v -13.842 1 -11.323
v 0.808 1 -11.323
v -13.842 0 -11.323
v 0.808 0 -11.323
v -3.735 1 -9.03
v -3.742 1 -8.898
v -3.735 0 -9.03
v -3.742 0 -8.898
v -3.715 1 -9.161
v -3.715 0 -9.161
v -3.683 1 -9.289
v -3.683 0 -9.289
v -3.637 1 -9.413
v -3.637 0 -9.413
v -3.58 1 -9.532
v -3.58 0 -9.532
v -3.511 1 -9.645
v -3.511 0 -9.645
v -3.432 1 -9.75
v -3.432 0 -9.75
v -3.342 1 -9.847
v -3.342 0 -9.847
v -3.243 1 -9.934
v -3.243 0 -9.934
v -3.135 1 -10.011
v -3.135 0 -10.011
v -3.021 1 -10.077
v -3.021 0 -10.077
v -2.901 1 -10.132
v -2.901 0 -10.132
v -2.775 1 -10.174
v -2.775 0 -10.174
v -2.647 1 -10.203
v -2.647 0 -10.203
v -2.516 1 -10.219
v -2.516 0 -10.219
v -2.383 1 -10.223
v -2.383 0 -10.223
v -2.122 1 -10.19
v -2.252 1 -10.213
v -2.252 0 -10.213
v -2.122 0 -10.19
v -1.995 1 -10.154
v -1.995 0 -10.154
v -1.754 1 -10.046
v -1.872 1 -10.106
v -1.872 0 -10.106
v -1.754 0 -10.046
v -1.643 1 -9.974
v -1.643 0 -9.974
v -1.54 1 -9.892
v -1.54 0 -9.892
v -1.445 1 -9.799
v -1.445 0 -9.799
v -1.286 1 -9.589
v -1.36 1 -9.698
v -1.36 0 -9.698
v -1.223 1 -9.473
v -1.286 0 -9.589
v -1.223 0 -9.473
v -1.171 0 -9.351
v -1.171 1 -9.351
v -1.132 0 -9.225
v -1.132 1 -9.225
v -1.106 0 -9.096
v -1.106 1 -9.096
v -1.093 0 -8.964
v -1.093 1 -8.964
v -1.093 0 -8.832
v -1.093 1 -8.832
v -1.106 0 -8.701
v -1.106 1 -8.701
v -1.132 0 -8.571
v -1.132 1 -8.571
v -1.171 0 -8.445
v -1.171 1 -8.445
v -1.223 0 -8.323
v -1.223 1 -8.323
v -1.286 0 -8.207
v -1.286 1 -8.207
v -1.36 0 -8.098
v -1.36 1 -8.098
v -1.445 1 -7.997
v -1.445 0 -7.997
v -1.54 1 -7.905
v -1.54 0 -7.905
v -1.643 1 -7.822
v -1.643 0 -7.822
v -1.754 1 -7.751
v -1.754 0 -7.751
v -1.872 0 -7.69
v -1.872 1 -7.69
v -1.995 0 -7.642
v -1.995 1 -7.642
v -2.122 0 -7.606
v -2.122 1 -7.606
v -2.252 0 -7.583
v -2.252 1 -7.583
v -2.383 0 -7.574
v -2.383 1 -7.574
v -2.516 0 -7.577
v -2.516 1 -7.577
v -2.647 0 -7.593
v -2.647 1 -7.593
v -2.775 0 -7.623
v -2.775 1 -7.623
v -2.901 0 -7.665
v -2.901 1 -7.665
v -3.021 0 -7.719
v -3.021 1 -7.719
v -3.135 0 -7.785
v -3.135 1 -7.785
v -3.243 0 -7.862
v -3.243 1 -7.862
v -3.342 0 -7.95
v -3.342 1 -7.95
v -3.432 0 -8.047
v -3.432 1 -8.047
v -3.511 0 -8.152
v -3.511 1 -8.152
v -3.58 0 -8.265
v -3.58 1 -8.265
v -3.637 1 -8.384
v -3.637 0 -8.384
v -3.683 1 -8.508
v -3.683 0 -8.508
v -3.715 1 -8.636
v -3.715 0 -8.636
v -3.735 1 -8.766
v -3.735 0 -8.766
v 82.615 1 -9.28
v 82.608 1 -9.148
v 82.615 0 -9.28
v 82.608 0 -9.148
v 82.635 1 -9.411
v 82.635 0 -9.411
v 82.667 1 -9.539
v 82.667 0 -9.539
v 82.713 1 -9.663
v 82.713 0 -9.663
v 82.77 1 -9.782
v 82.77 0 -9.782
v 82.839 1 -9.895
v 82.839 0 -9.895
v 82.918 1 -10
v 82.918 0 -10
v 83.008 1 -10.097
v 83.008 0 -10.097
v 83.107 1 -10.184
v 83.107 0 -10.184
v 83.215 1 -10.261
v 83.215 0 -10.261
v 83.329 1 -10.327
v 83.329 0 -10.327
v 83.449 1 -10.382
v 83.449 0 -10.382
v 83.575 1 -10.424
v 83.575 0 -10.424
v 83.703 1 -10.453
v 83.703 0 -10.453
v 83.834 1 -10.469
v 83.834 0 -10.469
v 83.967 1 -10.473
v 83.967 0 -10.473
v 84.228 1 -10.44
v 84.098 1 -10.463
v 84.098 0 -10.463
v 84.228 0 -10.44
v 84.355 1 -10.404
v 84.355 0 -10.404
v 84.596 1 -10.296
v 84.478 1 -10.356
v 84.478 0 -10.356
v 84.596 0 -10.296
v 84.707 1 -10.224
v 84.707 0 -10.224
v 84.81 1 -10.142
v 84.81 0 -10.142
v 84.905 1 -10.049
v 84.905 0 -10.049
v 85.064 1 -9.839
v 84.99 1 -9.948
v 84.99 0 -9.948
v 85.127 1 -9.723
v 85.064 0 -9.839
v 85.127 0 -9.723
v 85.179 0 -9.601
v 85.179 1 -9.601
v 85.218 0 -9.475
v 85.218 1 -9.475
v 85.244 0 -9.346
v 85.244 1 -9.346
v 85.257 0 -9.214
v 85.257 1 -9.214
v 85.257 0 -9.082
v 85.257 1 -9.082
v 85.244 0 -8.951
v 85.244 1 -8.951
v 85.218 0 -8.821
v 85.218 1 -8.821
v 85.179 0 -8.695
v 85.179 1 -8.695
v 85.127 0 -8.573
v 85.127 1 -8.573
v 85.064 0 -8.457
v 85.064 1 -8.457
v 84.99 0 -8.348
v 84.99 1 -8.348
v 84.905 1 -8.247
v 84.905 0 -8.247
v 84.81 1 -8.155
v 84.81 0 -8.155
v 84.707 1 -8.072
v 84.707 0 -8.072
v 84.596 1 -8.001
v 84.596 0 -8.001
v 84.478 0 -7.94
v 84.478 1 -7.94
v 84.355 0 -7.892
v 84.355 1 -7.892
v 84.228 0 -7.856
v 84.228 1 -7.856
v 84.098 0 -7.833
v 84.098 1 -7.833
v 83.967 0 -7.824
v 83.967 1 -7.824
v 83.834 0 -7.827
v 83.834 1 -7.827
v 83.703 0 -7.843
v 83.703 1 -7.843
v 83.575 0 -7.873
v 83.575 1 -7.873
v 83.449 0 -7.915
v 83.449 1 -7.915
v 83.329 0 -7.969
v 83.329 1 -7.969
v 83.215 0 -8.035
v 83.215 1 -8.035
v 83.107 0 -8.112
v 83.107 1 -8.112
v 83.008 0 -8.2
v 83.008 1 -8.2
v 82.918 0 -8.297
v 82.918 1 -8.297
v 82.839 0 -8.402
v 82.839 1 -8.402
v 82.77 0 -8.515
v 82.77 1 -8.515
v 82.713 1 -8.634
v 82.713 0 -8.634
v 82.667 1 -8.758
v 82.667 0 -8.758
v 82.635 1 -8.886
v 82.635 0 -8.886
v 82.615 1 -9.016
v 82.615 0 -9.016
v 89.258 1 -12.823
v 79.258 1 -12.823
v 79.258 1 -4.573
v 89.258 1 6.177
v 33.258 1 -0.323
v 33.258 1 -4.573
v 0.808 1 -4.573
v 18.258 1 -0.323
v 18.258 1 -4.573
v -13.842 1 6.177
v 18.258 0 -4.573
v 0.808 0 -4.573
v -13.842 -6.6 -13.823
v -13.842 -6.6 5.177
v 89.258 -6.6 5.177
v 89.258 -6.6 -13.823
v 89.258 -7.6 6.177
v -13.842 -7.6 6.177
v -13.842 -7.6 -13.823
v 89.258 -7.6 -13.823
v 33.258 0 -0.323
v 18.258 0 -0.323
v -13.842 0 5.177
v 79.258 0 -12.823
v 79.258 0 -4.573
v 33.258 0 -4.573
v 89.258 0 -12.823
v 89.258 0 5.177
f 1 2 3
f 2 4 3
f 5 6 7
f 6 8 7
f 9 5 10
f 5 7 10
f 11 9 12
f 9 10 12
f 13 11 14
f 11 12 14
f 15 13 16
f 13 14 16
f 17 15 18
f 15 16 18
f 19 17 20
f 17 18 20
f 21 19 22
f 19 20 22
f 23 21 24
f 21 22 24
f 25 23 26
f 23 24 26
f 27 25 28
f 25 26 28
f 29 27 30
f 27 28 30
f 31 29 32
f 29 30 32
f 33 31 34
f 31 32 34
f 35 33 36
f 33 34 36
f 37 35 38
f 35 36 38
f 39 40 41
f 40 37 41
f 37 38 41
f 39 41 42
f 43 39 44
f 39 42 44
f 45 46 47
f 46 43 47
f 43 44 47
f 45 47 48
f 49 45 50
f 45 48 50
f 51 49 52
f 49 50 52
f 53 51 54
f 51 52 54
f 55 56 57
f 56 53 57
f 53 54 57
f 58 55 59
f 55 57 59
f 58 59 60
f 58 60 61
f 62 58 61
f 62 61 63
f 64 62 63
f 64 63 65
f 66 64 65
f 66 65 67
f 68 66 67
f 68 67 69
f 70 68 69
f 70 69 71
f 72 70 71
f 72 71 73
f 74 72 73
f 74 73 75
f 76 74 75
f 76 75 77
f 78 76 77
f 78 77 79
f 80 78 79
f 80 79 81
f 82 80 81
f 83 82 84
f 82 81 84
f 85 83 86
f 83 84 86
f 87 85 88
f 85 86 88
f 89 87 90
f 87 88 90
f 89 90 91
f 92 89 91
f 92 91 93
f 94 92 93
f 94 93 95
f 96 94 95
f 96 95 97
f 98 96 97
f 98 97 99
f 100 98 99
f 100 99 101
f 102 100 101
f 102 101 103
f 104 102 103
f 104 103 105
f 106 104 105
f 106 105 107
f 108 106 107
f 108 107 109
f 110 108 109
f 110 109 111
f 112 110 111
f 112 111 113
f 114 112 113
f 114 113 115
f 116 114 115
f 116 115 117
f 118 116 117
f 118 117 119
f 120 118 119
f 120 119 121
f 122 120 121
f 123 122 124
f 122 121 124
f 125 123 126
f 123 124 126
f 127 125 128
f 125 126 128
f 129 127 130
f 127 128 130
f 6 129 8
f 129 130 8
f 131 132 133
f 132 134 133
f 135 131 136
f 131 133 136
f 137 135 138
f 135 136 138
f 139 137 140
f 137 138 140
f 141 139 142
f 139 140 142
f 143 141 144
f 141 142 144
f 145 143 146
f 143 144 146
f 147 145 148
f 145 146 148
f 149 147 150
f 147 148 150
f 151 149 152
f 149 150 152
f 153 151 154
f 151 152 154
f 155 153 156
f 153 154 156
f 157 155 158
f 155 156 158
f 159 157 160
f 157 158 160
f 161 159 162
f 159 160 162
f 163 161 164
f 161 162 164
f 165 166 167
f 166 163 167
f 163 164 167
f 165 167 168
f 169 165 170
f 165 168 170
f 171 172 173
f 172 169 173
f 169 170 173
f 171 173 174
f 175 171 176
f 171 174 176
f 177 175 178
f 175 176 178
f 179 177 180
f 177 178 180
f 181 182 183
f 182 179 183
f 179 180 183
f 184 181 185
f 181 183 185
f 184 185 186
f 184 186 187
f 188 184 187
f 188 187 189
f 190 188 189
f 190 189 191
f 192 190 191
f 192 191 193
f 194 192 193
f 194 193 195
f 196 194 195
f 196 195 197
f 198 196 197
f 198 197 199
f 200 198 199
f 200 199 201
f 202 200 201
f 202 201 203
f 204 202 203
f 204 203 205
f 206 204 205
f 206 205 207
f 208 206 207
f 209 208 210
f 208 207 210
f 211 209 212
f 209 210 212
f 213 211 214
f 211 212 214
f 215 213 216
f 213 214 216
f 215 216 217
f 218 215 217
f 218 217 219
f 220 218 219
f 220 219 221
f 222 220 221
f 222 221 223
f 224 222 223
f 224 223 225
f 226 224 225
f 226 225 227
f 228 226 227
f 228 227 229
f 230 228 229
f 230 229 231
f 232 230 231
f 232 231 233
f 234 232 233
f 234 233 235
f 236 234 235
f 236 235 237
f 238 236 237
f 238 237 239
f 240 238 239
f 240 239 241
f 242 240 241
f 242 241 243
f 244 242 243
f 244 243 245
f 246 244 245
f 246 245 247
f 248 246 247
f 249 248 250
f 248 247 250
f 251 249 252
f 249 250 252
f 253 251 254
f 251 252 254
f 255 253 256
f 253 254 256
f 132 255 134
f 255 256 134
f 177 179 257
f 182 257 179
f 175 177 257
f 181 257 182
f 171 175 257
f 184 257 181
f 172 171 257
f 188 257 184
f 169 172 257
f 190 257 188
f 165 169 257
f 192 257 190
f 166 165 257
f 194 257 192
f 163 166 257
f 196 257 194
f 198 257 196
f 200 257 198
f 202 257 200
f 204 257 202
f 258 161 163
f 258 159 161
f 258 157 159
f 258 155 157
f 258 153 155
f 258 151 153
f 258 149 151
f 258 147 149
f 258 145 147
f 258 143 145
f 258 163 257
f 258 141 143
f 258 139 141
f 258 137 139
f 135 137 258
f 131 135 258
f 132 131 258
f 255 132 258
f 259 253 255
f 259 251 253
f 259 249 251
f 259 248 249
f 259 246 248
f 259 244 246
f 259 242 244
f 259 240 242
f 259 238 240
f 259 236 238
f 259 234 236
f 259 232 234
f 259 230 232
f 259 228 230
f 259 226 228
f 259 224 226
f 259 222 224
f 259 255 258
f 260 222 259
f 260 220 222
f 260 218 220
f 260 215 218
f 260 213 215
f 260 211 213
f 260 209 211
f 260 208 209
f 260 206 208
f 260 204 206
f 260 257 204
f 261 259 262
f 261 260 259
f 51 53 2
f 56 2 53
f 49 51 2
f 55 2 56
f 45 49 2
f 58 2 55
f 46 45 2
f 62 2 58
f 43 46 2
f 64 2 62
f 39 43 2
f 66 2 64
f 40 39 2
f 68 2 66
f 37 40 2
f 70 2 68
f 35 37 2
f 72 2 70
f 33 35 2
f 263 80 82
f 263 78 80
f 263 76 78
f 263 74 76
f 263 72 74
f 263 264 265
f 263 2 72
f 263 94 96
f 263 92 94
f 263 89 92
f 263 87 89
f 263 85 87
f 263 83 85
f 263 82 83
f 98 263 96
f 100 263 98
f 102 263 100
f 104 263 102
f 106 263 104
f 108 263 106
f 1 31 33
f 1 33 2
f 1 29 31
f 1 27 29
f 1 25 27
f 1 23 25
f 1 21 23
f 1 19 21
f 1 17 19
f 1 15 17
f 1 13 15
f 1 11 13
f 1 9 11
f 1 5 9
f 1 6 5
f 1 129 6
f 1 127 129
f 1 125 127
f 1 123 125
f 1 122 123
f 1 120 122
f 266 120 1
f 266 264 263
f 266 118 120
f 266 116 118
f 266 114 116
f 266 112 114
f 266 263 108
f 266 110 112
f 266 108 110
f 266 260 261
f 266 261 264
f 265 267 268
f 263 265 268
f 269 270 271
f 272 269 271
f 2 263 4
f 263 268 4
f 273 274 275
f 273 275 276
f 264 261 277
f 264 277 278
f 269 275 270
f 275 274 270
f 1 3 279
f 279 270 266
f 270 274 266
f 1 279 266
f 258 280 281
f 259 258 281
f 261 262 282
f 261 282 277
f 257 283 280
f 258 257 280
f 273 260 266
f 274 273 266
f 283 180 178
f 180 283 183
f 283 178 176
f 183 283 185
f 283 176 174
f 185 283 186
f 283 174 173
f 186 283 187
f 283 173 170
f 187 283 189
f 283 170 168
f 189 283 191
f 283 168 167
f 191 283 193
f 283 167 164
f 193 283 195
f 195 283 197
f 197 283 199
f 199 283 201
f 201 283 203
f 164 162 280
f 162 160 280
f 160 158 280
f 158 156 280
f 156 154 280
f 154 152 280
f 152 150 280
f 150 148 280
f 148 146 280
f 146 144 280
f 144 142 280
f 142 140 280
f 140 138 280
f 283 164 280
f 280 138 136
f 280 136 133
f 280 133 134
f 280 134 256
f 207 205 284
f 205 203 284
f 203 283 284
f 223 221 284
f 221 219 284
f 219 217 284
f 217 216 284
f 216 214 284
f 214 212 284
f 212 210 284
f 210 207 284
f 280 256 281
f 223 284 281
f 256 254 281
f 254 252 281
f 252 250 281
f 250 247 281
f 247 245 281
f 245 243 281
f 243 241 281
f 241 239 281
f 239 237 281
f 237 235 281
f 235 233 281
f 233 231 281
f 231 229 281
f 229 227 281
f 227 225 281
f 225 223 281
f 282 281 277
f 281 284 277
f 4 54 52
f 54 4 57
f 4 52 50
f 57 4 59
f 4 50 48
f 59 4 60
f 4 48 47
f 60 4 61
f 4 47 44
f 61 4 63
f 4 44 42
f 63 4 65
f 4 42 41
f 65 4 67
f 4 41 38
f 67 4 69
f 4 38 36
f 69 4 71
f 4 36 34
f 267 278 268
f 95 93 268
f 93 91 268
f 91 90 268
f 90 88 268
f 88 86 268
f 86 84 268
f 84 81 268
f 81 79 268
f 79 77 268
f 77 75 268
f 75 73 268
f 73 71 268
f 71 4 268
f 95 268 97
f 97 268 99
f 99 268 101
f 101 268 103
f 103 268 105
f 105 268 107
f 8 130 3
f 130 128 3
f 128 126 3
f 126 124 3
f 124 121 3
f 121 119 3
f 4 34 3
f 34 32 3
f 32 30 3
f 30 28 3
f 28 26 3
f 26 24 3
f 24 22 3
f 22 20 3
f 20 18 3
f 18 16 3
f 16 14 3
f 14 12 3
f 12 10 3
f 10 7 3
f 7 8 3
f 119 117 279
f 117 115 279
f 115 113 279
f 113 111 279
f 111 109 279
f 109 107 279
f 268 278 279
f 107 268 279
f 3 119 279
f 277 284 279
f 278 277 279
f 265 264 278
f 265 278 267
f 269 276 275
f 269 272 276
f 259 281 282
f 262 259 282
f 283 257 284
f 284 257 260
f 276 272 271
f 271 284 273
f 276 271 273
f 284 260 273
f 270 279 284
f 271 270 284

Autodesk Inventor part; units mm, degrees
ref_plane "YZ Plane" through (0, 0, 0) normal (1, 0, 0) x (0, 1, 0)
ref_plane "XZ Plane" through (0, 0, 0) normal (0, 1, 0) x (-1, 0, 0)
ref_plane "XY Plane" through (0, 0, 0) normal (0, 0, 1) x (1, 0, 0)
sketch "Sketch1" plane through (0, 0, 0) normal (0, 1, 0) x (-1, 0, 0)
  line L0 (13.8415, 5.1768) -> (-89.2585, 5.1768)
  line L1 (-89.2585, 5.1768) -> (-89.2585, -12.8232)
  line L2 (-89.2585, -12.8232) -> (-79.2585, -12.8232)
  line L3 (-79.2585, -12.8232) -> (-79.2585, -4.5732)
  line L4 (-79.2585, -4.5732) -> (-0.8085, -4.5732)
  line L5 (-0.8085, -4.5732) -> (-0.8085, -11.3232)
  line L6 (-0.8085, -11.3232) -> (13.8415, -11.3232)
  line L7 (13.8415, -11.3232) -> (13.8415, 5.1768)
  circle A0 centre (2.4165, -8.8982) radius 1.325
  circle A1 centre (-83.9335, -9.1482) radius 1.325
  line L8 (13.8415, 5.1768) -> (-89.2585, 5.1768)
  line L9 (-89.2585, 5.1768) -> (-89.2585, 6.1768)
  line L10 (-89.2585, 6.1768) -> (13.8415, 6.1768)
  line L11 (13.8415, 6.1768) -> (13.8415, 5.1768)
  point P0 (0, 0)
  dimension "d0" = 2.65
  dimension "d1" = 2.65
  dimension "d2" = 103.1
  dimension "d3" = 14.65
  dimension "d4" = 10
  dimension "d5" = 18
  dimension "d6" = 16.5
  dimension "d7" = 14.075
  dimension "d8" = 11.425
  dimension "d9" = 9.75
  dimension "d10" = 14.325
  dimension "d11" = 5.325
  dimension "d14" = 1
extrude "Extrusion1" add sketch "Sketch1" along normal blind 1
extrude "Extrusion2" add sketch "Sketch1" against normal blind 7.6 contours L0 L9 L10 L11
sketch "Sketch3" plane through (89.2585, 0, 5.1768) normal (0, 0, -1) x (-1, 0, 0)
  line L0 (103.1, -7.6) -> (0, -7.6) projected
  line L1 (103.1, -7.6) -> (103.1, 1) projected
  line L2 (0, -7.6) -> (103.1, -7.6)
  line L3 (103.1, -7.6) -> (103.1, -6.6)
  line L4 (103.1, -6.6) -> (0, -6.6)
  line L5 (0, -6.6) -> (0, -7.6)
  point P0 (89.2585, 0)
  dimension "d17" = 1
extrude "Extrusion3" add sketch "Sketch3" along normal blind 19
sketch "Sketch4" plane through (0, 1, 0) normal (0, 1, 0) x (1, 0, 0)
  line L0 (79.2585, 4.5732) -> (0.8085, 4.5732) projected
  line L1 (18.2585, 4.5732) -> (33.2585, 4.5732)
  line L2 (33.2585, 4.5732) -> (33.2585, 0.3232)
  line L3 (33.2585, 0.3232) -> (18.2585, 0.3232)
  line L4 (18.2585, 0.3232) -> (18.2585, 4.5732)
  line L5 (0.8085, 4.5732) -> (0.8085, 11.3232) projected
  line L6 (79.2585, 12.8232) -> (79.2585, 4.5732) projected
  line L7 (-13.8415, -6.1768) -> (89.2585, -6.1768) projected
  point P0 (0, 0)
  point P1 (33.2585, 4.5732)
  dimension "d21" = 15
  dimension "d26" = 6.5
  dimension "d28" = 46
extrude "Extrusion4" cut sketch "Sketch4" against normal blind 2
properties part number "CO-1-03-jetsonMount"
